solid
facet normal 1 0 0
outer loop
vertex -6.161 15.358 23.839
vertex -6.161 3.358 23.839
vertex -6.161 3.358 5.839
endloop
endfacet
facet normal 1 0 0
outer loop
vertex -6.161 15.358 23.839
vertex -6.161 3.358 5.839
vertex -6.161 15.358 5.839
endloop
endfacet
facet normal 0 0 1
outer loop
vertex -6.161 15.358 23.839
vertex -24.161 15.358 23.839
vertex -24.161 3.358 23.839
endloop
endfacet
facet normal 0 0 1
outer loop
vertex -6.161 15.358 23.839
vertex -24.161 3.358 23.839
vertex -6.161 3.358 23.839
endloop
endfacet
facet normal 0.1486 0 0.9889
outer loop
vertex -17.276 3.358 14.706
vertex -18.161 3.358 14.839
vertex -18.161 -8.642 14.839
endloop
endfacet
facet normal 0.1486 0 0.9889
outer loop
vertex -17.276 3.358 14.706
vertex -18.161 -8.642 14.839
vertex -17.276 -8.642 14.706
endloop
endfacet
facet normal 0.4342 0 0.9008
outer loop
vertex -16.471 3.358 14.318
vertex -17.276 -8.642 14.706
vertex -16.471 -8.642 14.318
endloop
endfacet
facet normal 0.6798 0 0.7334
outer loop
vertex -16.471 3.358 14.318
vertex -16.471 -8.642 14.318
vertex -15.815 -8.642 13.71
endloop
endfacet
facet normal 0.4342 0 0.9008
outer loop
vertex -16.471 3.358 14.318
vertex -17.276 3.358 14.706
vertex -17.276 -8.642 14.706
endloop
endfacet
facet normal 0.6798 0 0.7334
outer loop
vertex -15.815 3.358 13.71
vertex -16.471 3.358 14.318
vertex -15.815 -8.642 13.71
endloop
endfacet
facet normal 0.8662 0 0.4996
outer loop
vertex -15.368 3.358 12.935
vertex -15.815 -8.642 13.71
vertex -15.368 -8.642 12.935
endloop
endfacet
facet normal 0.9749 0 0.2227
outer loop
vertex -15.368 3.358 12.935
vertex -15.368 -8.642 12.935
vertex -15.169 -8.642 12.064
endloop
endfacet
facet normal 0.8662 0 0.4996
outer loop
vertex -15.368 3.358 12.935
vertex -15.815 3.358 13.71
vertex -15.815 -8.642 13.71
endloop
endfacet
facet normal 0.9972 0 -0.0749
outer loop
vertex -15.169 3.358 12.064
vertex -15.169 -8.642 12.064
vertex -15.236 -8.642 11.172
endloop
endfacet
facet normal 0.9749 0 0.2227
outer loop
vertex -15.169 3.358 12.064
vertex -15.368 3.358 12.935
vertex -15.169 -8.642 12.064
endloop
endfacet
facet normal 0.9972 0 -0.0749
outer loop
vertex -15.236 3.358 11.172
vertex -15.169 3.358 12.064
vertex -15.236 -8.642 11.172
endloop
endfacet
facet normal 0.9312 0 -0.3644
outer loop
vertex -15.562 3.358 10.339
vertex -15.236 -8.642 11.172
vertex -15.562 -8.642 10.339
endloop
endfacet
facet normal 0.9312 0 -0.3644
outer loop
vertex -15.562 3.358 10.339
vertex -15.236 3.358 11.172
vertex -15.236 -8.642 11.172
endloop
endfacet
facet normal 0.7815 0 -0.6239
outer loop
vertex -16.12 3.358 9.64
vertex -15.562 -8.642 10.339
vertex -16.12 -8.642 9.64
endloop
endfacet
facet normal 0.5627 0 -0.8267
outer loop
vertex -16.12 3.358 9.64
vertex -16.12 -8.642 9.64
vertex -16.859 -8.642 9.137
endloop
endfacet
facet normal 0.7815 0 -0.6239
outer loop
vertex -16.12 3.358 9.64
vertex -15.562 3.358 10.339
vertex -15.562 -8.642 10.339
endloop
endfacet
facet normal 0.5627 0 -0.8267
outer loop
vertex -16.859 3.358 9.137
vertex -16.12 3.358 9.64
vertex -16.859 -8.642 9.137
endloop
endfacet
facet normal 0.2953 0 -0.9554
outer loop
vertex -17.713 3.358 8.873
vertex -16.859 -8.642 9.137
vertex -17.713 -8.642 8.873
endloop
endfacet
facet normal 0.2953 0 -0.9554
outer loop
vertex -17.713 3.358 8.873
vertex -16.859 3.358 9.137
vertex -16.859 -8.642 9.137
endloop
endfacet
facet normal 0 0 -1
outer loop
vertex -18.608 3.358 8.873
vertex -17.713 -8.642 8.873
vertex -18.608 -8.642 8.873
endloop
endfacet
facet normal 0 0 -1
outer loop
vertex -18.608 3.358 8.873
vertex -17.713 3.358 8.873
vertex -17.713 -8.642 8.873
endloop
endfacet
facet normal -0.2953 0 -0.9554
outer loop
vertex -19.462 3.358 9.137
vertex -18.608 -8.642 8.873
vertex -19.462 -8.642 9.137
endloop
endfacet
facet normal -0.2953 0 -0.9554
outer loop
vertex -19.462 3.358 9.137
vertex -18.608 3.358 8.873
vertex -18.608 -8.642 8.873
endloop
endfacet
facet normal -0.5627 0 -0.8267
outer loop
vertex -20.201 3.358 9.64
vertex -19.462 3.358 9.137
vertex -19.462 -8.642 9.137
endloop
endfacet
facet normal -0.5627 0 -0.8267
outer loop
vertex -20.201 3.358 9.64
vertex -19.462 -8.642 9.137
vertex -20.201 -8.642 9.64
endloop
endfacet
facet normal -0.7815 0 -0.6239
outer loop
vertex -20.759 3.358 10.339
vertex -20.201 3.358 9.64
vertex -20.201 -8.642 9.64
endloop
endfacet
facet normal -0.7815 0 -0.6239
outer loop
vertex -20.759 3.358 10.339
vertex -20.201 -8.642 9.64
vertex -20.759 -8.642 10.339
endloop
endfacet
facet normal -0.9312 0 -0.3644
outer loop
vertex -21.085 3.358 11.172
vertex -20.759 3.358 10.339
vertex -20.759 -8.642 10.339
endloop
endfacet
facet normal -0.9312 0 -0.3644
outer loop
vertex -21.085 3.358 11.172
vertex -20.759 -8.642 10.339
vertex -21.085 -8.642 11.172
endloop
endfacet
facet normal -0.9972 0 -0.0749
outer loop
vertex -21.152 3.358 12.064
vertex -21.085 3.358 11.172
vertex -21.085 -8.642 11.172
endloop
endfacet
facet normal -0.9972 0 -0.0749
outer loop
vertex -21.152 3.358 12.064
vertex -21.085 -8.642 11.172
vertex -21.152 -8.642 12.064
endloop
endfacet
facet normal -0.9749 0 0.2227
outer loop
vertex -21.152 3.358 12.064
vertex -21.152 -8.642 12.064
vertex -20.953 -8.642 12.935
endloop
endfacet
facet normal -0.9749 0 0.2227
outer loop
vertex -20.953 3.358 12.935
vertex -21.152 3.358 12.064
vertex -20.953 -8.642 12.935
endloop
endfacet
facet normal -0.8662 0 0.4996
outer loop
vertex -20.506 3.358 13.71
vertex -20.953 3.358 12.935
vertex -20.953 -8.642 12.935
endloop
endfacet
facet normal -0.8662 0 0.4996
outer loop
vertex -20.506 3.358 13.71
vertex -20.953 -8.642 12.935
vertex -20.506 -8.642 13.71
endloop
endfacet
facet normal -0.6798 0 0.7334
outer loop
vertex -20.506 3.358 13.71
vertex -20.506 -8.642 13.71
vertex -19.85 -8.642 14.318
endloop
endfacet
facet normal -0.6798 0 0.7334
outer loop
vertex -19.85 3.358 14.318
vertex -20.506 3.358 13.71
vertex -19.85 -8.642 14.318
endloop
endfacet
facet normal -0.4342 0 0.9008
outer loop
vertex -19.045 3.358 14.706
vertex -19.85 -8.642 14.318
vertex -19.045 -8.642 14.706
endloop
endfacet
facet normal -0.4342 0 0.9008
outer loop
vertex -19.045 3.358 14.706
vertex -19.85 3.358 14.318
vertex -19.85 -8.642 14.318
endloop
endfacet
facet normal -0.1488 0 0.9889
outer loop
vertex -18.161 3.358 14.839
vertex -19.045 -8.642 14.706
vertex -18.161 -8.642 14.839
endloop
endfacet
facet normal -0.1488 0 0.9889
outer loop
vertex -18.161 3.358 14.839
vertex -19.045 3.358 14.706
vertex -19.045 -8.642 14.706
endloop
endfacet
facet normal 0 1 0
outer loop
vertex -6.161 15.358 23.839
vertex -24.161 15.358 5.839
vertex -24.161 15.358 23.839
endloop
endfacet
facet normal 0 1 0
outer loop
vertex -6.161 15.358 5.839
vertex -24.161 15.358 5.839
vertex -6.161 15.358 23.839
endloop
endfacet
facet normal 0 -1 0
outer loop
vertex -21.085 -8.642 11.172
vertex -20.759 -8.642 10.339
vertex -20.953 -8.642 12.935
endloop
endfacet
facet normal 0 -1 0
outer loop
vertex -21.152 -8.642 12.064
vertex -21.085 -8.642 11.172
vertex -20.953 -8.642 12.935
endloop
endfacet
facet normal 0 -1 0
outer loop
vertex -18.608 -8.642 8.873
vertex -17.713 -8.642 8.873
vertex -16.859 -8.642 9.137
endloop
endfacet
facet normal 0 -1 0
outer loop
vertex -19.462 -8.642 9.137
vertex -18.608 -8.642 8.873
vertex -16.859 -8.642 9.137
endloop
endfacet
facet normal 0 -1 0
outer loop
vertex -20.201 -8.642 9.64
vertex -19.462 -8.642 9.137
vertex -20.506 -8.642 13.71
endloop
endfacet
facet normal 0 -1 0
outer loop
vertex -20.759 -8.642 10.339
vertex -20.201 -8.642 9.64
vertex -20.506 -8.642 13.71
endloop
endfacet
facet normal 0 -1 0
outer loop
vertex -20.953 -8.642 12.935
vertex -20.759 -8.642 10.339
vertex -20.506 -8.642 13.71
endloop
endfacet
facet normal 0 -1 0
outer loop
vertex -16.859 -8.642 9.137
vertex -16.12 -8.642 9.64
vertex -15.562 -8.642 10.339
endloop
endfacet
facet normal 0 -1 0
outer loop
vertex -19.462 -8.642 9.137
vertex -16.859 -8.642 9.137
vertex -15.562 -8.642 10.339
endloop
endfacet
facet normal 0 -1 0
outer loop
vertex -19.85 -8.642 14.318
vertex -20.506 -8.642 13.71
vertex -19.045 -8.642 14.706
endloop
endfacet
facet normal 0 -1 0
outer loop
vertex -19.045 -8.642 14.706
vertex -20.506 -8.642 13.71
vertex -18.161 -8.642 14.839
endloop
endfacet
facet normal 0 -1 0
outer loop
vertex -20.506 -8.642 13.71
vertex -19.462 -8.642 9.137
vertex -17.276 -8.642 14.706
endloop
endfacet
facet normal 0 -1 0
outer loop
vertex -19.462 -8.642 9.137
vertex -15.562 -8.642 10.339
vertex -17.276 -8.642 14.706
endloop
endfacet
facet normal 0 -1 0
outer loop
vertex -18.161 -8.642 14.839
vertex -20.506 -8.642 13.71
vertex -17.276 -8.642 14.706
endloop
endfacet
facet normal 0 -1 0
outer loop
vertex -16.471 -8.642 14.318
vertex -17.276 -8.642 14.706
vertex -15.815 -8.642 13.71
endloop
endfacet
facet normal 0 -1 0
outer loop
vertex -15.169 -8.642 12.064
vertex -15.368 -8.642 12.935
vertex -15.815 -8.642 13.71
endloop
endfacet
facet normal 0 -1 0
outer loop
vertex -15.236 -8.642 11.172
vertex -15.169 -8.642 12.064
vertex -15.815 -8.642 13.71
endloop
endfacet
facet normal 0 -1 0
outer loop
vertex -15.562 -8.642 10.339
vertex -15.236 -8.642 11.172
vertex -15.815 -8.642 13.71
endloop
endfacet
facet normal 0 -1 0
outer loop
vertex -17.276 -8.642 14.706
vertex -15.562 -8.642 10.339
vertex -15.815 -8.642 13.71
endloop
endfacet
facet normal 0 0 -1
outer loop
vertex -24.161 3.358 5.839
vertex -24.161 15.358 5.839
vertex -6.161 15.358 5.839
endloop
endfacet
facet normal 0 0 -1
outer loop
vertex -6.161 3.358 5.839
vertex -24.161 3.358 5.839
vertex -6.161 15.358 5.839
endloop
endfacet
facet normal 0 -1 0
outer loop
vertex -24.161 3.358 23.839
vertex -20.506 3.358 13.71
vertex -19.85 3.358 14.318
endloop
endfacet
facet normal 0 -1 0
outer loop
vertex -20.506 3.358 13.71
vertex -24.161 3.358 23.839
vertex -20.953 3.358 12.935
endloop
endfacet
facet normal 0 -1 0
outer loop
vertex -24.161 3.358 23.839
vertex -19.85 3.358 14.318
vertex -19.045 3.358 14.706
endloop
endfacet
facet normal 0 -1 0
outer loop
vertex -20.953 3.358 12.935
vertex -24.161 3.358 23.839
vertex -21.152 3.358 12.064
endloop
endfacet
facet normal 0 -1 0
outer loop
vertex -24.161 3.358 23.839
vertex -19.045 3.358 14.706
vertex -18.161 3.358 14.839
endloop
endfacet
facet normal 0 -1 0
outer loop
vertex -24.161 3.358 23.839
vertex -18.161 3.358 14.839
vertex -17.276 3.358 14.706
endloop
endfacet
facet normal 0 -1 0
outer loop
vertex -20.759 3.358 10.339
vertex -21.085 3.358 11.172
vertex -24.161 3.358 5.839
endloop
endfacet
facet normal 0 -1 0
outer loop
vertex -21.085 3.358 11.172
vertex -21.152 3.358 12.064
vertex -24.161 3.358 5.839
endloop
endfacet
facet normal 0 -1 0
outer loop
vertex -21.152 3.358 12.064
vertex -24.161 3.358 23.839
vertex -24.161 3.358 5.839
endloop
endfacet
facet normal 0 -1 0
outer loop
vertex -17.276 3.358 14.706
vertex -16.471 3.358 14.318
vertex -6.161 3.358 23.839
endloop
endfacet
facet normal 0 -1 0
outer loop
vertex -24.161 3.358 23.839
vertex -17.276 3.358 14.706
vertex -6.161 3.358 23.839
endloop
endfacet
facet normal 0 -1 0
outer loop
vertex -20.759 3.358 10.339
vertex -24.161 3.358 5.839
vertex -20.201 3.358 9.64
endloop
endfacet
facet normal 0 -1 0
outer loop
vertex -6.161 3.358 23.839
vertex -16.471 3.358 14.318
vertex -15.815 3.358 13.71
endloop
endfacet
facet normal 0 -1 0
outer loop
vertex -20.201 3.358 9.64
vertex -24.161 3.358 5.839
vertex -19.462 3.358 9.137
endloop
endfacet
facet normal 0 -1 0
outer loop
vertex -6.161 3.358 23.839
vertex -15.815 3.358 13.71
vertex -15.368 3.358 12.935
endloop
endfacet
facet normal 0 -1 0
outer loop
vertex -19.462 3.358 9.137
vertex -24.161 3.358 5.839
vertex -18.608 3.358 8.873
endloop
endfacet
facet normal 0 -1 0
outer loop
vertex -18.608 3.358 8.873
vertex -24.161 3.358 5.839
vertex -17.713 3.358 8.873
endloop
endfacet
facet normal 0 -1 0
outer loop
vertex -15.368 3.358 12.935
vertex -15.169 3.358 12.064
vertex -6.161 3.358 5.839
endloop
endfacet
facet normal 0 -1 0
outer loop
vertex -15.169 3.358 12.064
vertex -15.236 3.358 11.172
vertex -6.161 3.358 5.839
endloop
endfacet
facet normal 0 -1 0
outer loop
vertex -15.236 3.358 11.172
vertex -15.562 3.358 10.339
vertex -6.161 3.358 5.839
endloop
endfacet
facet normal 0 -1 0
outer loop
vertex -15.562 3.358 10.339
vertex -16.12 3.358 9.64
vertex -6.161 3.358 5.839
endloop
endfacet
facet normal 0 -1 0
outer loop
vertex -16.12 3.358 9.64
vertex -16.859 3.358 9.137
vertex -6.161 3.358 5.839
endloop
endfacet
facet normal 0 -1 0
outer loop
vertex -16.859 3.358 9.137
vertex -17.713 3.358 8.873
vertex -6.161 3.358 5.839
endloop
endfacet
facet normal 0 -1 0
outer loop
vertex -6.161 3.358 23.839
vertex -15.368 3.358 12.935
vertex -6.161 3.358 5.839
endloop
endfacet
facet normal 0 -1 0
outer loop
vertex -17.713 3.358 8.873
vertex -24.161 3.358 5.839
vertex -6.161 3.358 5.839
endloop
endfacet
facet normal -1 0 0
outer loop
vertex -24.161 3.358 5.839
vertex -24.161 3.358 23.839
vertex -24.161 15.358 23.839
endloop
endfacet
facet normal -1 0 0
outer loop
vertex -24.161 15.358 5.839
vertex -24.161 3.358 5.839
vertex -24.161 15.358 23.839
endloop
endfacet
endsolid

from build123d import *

# Parameters (mm, degrees)
ESQUISSE1_W         = 30
ESQUISSE1_H         = 20
BOSS_EXTRU_1_DEPTH  = 30
SKETCH1_R           = 5
BOSS_EXTRUDE1_DEPTH = 20
SCALE1_SCALE        = 0.6


with BuildPart() as part:
    # Esquisse1 → Boss.-Extru.1 (new body)
    with BuildSketch(Plane.XY):
        with Locations((-15, 10)):
            Rectangle(ESQUISSE1_W, ESQUISSE1_H)
    extrude(amount=BOSS_EXTRU_1_DEPTH)

    # Sketch1 → Boss-Extrude1 (add)
    with BuildSketch(Plane(origin=(0, 0, 0), x_dir=(1, 0, 0), z_dir=(0, 1, 0))):
        with Locations(Location((-20, -10, 0), (0, 0, 270))):
            Circle(SKETCH1_R)
    extrude(amount=-BOSS_EXTRUDE1_DEPTH)


with BuildPart() as part_1:
    # Scale1: scaled about (-15.401311296, 8.394754817, 14.598688704)
    add(part.part.scale(SCALE1_SCALE).moved(Location((-6.160524518, 3.357901927, 5.839475482))))


solid = part_1.part
